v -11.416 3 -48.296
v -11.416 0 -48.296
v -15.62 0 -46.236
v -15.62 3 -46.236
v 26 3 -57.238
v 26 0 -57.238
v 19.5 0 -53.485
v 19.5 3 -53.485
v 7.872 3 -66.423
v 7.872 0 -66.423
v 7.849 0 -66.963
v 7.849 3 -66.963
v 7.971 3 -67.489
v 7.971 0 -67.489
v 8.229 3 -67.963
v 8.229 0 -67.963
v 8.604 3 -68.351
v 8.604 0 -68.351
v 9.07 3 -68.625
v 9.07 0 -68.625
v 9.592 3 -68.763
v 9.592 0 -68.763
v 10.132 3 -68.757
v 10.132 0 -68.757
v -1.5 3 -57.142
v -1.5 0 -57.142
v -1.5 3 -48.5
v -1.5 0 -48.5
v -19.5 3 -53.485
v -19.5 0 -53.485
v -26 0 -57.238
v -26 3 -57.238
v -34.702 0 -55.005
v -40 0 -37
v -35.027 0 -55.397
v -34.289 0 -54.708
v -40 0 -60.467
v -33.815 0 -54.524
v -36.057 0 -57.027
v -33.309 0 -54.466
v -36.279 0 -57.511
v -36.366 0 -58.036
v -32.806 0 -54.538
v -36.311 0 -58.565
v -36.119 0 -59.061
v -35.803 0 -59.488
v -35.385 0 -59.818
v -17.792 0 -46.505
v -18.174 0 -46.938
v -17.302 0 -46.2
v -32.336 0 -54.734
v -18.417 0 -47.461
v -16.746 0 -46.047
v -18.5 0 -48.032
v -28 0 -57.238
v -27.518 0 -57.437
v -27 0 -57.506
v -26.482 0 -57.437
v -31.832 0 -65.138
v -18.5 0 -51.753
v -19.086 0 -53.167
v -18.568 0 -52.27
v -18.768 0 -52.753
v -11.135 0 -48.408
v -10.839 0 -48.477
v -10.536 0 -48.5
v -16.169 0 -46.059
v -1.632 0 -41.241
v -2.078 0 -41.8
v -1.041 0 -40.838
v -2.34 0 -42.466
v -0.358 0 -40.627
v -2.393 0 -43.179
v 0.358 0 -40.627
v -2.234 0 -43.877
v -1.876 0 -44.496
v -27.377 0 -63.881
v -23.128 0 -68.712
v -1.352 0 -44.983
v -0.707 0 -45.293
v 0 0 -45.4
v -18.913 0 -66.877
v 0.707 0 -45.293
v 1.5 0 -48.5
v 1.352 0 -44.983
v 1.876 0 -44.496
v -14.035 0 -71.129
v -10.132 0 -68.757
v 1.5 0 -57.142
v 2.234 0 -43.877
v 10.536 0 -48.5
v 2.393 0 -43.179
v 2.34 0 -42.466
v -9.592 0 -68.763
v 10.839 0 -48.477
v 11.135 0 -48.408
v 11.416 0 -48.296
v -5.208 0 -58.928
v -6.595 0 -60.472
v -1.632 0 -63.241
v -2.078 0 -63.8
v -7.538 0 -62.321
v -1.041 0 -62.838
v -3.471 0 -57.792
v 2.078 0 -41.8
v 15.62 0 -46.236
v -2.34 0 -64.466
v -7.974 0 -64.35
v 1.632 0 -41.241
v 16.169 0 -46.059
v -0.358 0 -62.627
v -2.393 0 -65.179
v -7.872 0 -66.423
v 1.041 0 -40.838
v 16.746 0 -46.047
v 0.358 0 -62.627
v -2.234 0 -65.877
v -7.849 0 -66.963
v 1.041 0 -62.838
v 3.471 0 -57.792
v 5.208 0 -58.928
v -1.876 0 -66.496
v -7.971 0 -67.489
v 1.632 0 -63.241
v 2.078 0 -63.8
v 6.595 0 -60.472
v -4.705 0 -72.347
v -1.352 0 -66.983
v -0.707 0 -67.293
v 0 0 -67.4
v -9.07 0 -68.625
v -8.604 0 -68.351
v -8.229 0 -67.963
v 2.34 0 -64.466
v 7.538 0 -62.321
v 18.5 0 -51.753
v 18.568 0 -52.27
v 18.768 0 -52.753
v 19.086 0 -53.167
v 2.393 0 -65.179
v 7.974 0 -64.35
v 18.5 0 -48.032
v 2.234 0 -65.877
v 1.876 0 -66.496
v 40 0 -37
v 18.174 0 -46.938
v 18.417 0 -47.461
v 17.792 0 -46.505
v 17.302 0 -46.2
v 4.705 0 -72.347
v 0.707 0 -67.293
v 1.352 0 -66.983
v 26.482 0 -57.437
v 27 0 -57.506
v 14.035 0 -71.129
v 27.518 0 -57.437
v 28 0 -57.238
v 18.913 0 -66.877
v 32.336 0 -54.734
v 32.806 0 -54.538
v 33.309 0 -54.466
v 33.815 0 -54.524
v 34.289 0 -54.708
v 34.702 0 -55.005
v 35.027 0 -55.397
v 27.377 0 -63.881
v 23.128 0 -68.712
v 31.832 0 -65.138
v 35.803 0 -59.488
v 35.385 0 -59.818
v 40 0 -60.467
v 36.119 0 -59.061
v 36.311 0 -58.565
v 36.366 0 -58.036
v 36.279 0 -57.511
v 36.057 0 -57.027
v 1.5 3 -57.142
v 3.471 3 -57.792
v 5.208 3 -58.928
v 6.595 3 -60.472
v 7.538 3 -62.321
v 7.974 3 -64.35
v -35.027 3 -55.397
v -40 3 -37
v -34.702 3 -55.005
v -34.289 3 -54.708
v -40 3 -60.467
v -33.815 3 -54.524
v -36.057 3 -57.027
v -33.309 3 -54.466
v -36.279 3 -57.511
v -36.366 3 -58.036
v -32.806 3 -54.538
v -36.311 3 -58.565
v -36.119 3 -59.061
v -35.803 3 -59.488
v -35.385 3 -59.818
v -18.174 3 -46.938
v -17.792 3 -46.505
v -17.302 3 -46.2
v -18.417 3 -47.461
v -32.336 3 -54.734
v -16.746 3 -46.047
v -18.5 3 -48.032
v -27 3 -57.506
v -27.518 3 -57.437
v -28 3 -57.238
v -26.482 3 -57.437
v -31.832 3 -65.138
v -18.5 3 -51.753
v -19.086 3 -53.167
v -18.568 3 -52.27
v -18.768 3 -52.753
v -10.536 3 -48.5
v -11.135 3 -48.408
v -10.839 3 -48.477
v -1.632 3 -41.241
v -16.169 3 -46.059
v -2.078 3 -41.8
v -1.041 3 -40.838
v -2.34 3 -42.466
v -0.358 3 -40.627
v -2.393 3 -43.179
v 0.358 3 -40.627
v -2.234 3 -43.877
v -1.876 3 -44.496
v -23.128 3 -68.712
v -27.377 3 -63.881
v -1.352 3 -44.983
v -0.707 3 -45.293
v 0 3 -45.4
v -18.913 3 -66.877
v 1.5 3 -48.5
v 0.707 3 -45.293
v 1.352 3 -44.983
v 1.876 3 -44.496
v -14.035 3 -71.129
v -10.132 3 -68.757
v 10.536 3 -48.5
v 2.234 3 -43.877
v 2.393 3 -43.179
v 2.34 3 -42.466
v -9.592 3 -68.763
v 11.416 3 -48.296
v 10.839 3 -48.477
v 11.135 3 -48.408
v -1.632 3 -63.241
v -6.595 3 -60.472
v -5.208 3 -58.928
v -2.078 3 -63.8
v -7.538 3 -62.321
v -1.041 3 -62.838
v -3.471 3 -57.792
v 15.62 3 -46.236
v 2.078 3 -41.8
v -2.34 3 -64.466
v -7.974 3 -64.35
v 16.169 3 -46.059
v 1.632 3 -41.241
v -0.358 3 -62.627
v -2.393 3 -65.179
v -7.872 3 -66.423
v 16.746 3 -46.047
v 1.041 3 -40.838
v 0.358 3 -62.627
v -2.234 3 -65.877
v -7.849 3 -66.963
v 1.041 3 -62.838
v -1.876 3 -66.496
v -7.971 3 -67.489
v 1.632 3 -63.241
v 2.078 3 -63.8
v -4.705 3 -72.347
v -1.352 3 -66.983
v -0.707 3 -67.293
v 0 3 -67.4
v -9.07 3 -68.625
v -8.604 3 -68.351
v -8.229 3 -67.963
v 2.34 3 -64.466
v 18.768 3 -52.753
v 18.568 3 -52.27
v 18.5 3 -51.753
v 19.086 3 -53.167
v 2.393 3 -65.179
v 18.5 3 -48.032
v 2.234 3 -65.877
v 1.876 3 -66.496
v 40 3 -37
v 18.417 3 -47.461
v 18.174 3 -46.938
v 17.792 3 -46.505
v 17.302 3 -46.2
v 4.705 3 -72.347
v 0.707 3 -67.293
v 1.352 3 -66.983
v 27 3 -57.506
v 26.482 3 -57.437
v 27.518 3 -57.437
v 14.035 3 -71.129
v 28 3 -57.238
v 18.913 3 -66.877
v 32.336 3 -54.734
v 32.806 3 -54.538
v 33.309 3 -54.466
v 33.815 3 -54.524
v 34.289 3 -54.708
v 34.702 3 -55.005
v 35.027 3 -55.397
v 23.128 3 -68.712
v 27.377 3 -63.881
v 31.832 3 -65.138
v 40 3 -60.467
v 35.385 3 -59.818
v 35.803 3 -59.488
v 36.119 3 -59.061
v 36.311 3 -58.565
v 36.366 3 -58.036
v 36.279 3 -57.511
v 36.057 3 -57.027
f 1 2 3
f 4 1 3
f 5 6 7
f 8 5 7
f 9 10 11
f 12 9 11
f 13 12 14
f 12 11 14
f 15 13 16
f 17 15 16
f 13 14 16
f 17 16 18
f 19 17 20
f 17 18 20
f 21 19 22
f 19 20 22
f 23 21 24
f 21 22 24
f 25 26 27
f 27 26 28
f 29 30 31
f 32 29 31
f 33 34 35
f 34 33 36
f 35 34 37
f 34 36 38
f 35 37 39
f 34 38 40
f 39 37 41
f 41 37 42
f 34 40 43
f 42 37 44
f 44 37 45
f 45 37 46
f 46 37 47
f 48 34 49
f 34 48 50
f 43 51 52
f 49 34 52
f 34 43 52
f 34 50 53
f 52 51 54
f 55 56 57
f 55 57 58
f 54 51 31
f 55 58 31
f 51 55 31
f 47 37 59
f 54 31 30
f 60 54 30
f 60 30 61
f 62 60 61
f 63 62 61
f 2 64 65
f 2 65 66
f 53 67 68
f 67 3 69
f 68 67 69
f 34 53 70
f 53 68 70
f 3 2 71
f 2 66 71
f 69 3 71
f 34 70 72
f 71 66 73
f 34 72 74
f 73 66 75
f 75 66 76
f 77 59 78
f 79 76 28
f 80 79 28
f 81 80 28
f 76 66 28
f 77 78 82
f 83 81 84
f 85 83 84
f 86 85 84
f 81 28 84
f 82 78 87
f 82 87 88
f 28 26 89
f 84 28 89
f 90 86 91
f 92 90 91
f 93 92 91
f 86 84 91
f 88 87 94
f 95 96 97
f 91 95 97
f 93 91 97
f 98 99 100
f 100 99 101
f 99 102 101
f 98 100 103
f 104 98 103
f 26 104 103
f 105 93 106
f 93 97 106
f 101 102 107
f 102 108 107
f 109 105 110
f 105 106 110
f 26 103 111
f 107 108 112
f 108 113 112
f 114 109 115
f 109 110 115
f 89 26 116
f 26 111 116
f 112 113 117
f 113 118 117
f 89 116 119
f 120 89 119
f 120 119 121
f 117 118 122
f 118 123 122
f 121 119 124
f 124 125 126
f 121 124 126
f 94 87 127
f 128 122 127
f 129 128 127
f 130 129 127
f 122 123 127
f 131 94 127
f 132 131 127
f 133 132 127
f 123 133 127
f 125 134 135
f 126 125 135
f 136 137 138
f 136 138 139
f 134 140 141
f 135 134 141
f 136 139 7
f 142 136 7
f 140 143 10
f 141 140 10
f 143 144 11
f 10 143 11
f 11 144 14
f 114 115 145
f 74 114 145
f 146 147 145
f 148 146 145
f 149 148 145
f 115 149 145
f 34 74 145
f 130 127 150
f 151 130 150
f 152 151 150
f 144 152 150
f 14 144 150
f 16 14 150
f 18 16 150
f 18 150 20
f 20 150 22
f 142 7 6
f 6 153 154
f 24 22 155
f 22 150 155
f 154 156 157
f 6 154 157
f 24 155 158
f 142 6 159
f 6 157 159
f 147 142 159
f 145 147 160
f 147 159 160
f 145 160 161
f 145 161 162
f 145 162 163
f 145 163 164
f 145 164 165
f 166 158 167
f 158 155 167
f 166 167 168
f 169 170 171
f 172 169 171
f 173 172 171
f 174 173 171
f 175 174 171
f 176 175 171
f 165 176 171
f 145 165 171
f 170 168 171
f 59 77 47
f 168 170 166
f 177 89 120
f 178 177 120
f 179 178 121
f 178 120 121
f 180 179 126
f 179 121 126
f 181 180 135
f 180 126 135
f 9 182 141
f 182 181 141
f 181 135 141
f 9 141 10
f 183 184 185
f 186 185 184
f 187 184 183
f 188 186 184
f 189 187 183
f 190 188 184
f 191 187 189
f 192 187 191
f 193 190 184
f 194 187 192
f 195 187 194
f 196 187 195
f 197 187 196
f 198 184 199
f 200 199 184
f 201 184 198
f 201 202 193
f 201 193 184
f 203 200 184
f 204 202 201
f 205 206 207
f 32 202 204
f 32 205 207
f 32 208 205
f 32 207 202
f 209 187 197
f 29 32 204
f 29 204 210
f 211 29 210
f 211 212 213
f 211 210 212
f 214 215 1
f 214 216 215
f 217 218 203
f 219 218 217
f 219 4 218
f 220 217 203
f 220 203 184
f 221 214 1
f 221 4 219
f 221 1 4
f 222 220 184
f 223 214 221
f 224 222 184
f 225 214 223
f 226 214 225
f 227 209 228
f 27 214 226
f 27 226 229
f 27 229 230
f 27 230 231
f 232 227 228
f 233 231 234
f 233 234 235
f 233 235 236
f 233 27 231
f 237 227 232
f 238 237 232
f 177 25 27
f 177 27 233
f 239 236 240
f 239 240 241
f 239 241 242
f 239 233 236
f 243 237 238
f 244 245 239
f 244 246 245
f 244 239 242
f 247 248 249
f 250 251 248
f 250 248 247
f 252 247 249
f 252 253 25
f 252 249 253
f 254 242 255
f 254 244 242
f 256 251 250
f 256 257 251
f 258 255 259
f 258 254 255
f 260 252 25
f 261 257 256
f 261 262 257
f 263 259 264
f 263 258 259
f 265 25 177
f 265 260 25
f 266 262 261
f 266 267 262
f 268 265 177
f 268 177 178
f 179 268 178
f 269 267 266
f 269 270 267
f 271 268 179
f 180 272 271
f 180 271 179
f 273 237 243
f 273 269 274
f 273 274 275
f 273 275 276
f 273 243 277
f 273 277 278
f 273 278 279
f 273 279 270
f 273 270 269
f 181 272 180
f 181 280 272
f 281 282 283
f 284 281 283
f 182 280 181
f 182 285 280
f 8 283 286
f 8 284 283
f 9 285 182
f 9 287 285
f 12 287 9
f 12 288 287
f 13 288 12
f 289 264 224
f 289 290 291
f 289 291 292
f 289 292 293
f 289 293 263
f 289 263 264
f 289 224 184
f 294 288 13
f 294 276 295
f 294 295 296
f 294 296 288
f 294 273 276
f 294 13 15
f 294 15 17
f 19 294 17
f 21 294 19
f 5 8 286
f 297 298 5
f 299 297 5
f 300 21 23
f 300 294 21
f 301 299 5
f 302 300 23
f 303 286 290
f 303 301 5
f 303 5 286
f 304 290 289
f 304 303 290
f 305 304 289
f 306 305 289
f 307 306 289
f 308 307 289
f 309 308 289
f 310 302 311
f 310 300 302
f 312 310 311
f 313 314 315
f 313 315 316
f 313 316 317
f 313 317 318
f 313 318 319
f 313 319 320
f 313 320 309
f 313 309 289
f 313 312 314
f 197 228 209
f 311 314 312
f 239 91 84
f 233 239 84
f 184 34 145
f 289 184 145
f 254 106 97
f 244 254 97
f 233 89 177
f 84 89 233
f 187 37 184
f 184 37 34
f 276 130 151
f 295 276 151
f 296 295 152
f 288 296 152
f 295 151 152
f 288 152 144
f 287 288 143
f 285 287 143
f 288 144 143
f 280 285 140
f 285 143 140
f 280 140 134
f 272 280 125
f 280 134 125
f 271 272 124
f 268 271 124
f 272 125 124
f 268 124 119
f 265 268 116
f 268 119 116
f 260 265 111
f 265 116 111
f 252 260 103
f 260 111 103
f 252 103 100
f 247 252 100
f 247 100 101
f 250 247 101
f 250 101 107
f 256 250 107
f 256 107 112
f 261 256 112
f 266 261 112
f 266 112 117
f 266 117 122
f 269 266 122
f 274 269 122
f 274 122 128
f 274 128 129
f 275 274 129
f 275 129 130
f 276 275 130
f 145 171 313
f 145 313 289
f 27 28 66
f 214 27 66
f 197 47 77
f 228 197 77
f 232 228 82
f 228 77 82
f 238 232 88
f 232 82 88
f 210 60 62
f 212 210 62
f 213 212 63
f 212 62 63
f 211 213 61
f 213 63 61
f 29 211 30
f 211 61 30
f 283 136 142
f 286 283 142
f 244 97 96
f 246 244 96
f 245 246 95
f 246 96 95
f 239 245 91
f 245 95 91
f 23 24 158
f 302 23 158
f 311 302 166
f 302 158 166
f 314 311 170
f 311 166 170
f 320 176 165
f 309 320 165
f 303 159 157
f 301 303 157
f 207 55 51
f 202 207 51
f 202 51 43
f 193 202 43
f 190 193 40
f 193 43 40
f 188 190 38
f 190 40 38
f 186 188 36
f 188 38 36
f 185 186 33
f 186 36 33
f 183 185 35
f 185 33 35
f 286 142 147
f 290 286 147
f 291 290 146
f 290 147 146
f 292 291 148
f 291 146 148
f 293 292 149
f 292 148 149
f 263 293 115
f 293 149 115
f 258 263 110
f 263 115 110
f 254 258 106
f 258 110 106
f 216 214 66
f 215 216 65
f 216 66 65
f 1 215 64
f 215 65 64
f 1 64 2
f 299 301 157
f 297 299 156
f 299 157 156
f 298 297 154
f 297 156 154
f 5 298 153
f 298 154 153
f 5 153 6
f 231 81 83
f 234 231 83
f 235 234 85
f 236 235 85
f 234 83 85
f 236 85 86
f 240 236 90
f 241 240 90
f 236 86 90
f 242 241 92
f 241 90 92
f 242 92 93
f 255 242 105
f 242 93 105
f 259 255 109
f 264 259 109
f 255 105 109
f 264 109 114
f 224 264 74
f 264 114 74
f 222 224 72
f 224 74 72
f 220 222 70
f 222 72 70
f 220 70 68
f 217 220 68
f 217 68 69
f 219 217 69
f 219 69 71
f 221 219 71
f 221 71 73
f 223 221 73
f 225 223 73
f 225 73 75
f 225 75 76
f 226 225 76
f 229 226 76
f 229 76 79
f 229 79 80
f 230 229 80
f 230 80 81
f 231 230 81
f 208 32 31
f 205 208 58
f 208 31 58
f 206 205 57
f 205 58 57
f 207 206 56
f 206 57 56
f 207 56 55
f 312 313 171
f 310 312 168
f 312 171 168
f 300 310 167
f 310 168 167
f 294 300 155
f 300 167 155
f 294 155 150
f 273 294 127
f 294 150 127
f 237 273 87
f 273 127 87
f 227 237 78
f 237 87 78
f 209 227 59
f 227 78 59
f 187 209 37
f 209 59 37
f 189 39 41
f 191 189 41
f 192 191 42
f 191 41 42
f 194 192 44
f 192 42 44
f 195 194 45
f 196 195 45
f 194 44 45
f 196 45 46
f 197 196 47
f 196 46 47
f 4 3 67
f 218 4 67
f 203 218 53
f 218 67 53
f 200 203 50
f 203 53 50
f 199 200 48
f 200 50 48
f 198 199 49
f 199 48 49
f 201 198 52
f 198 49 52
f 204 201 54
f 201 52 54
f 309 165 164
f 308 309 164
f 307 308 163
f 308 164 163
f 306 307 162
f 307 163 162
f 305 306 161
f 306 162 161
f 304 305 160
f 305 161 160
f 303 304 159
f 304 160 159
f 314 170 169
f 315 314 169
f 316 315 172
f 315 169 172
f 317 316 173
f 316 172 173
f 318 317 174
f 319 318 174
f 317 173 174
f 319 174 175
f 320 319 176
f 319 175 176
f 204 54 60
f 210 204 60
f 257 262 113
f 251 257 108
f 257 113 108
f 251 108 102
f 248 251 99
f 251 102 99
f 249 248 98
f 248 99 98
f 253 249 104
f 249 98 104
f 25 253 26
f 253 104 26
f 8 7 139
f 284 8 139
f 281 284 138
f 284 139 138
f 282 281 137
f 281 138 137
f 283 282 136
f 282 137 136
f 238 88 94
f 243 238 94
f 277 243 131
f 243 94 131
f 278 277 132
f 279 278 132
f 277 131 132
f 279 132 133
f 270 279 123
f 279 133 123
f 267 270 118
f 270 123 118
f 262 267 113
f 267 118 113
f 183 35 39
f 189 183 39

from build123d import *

# Parameters (mm, degrees)
BOSS_EXTRUDE1_DEPTH  = 3
CUT_EXTRUDE12_DEPTH  = 103.574363269
SKETCH11_OUTSIDE_W   = 186.736
SKETCH11_OUTSIDE_H   = 177.534
SKETCH11_OUTSIDE_W_2 = 80
SKETCH11_OUTSIDE_H_2 = 40
CUT_EXTRUDE13_DEPTH  = 103.574363269
SKETCH12_R           = 2.4
CUT_EXTRUDE15_DEPTH  = 83.856804186
SKETCH13_W           = 3
SKETCH13_H           = 13.331578006
BOSS_EXTRUDE2_DEPTH  = 3


with BuildPart() as part:
    # Sketch1 → Boss-Extrude1 (new body)
    with BuildSketch(Plane(origin=(0, 0, 0), x_dir=(1, 0, 0), z_dir=(0, 1, 0))):
        with BuildLine():
            ThreePointArc((36.543377003, -62.616544118), (0, 72.5), (-36.543377003, -62.616544118))
            ThreePointArc((-36.543377003, -62.616544118), (-33.085954668, -63.20954405), (-30.089832649, -61.38507948))
            ThreePointArc((-30.089832649, -61.38507948), (0, -46.75), (30.089832649, -61.38507948))
            ThreePointArc((30.089832649, -61.38507948), (33.085954668, -63.20954405), (36.543377003, -62.616544118))
        make_face()
    extrude(amount=BOSS_EXTRUDE1_DEPTH)

    # Sketch10 → Cut-Extrude12 (cut, through all)
    with BuildSketch(Plane.XZ):
        with BuildLine():
            Line((-18.5, -48.031932838), (-18.5, -51.75277675))
            ThreePointArc((-18.5, -51.75277675), (-18.767949192, -52.75277675), (-19.5, -53.484827557))
            Line((-19.5, -53.484827557), (-26, -57.237604307))
            ThreePointArc((-26, -57.237604307), (-27, -57.505553499), (-28, -57.237604307))
            Line((-28, -57.237604307), (-32.336247441, -54.73407068))
            ThreePointArc((-32.336247441, -54.73407068), (-33.814934269, -54.524251533), (-35.026688711, -55.397286461))
            Line((-35.026688711, -55.397286461), (-36.057344072, -57.027343779))
            ThreePointArc((-36.057344072, -57.027343779), (-36.311279162, -58.56458095), (-35.385181403, -59.817547066))
            ThreePointArc((-35.385181403, -59.817547066), (-23.193446557, -65.515754112), (-10.132084292, -68.757478632))
            ThreePointArc((-10.132084292, -68.757478632), (-8.40348615, -68.169871795), (-7.872410817, -66.423076923))
            ThreePointArc((-7.872410817, -66.423076923), (0, -57), (7.872410817, -66.423076923))
            ThreePointArc((7.872410817, -66.423076923), (8.40348615, -68.169871795), (10.132084292, -68.757478632))
            ThreePointArc((10.132084292, -68.757478632), (23.193446557, -65.515754112), (35.385181403, -59.817547066))
            ThreePointArc((35.385181403, -59.817547066), (36.311279162, -58.56458095), (36.057344072, -57.027343779))
            Line((36.057344072, -57.027343779), (35.026688711, -55.397286461))
            ThreePointArc((35.026688711, -55.397286461), (33.814934269, -54.524251533), (32.336247441, -54.73407068))
            Line((32.336247441, -54.73407068), (28, -57.237604307))
            ThreePointArc((28, -57.237604307), (27, -57.505553499), (26, -57.237604307))
            Line((26, -57.237604307), (19.5, -53.484827557))
            ThreePointArc((19.5, -53.484827557), (18.767949192, -52.75277675), (18.5, -51.75277675))
            Line((18.5, -51.75277675), (18.5, -48.031932838))
            ThreePointArc((18.5, -48.031932838), (17.558247208, -46.334843316), (15.619887154, -46.235992589))
            Line((15.619887154, -46.235992589), (11.416400149, -48.295940249))
            ThreePointArc((11.416400149, -48.295940249), (10.988017035, -48.448317287), (10.536287302, -48.5))
            Line((10.536287302, -48.5), (-10.536287302, -48.5))
            ThreePointArc((-10.536287302, -48.5), (-10.988017035, -48.448317287), (-11.416400149, -48.295940249))
            Line((-11.416400149, -48.295940249), (-15.619887154, -46.235992589))
            ThreePointArc((-15.619887154, -46.235992589), (-17.558247208, -46.334843316), (-18.5, -48.031932838))
        make_face()
    extrude(amount=-CUT_EXTRUDE12_DEPTH, mode=Mode.SUBTRACT)

    # Sketch11 outside → Cut-Extrude13 (cut, through all)
    with BuildSketch(Plane.XZ):
        with Locations((0, -4.601)):
            Rectangle(SKETCH11_OUTSIDE_W, SKETCH11_OUTSIDE_H)
        with Locations((0, -57)):
            Rectangle(SKETCH11_OUTSIDE_W_2, SKETCH11_OUTSIDE_H_2, mode=Mode.SUBTRACT)
    extrude(amount=-CUT_EXTRUDE13_DEPTH, mode=Mode.SUBTRACT)

    # Sketch12 → Cut-Extrude15 (cut, through all)
    with BuildSketch(Plane.XZ):
        with Locations(Location((0, -65, 0), (0, 0, 270))):
            Circle(SKETCH12_R)
        with Locations(Location((0, -43, 0), (0, 0, 270))):
            Circle(SKETCH12_R)
    extrude(amount=-CUT_EXTRUDE15_DEPTH, mode=Mode.SUBTRACT)

    # Sketch13 → Boss-Extrude2 (add)
    with BuildSketch(Plane.XZ):
        with Locations((0, -53.718139369)):
            Rectangle(SKETCH13_W, SKETCH13_H)
    extrude(amount=-BOSS_EXTRUDE2_DEPTH)


solid = part.part
